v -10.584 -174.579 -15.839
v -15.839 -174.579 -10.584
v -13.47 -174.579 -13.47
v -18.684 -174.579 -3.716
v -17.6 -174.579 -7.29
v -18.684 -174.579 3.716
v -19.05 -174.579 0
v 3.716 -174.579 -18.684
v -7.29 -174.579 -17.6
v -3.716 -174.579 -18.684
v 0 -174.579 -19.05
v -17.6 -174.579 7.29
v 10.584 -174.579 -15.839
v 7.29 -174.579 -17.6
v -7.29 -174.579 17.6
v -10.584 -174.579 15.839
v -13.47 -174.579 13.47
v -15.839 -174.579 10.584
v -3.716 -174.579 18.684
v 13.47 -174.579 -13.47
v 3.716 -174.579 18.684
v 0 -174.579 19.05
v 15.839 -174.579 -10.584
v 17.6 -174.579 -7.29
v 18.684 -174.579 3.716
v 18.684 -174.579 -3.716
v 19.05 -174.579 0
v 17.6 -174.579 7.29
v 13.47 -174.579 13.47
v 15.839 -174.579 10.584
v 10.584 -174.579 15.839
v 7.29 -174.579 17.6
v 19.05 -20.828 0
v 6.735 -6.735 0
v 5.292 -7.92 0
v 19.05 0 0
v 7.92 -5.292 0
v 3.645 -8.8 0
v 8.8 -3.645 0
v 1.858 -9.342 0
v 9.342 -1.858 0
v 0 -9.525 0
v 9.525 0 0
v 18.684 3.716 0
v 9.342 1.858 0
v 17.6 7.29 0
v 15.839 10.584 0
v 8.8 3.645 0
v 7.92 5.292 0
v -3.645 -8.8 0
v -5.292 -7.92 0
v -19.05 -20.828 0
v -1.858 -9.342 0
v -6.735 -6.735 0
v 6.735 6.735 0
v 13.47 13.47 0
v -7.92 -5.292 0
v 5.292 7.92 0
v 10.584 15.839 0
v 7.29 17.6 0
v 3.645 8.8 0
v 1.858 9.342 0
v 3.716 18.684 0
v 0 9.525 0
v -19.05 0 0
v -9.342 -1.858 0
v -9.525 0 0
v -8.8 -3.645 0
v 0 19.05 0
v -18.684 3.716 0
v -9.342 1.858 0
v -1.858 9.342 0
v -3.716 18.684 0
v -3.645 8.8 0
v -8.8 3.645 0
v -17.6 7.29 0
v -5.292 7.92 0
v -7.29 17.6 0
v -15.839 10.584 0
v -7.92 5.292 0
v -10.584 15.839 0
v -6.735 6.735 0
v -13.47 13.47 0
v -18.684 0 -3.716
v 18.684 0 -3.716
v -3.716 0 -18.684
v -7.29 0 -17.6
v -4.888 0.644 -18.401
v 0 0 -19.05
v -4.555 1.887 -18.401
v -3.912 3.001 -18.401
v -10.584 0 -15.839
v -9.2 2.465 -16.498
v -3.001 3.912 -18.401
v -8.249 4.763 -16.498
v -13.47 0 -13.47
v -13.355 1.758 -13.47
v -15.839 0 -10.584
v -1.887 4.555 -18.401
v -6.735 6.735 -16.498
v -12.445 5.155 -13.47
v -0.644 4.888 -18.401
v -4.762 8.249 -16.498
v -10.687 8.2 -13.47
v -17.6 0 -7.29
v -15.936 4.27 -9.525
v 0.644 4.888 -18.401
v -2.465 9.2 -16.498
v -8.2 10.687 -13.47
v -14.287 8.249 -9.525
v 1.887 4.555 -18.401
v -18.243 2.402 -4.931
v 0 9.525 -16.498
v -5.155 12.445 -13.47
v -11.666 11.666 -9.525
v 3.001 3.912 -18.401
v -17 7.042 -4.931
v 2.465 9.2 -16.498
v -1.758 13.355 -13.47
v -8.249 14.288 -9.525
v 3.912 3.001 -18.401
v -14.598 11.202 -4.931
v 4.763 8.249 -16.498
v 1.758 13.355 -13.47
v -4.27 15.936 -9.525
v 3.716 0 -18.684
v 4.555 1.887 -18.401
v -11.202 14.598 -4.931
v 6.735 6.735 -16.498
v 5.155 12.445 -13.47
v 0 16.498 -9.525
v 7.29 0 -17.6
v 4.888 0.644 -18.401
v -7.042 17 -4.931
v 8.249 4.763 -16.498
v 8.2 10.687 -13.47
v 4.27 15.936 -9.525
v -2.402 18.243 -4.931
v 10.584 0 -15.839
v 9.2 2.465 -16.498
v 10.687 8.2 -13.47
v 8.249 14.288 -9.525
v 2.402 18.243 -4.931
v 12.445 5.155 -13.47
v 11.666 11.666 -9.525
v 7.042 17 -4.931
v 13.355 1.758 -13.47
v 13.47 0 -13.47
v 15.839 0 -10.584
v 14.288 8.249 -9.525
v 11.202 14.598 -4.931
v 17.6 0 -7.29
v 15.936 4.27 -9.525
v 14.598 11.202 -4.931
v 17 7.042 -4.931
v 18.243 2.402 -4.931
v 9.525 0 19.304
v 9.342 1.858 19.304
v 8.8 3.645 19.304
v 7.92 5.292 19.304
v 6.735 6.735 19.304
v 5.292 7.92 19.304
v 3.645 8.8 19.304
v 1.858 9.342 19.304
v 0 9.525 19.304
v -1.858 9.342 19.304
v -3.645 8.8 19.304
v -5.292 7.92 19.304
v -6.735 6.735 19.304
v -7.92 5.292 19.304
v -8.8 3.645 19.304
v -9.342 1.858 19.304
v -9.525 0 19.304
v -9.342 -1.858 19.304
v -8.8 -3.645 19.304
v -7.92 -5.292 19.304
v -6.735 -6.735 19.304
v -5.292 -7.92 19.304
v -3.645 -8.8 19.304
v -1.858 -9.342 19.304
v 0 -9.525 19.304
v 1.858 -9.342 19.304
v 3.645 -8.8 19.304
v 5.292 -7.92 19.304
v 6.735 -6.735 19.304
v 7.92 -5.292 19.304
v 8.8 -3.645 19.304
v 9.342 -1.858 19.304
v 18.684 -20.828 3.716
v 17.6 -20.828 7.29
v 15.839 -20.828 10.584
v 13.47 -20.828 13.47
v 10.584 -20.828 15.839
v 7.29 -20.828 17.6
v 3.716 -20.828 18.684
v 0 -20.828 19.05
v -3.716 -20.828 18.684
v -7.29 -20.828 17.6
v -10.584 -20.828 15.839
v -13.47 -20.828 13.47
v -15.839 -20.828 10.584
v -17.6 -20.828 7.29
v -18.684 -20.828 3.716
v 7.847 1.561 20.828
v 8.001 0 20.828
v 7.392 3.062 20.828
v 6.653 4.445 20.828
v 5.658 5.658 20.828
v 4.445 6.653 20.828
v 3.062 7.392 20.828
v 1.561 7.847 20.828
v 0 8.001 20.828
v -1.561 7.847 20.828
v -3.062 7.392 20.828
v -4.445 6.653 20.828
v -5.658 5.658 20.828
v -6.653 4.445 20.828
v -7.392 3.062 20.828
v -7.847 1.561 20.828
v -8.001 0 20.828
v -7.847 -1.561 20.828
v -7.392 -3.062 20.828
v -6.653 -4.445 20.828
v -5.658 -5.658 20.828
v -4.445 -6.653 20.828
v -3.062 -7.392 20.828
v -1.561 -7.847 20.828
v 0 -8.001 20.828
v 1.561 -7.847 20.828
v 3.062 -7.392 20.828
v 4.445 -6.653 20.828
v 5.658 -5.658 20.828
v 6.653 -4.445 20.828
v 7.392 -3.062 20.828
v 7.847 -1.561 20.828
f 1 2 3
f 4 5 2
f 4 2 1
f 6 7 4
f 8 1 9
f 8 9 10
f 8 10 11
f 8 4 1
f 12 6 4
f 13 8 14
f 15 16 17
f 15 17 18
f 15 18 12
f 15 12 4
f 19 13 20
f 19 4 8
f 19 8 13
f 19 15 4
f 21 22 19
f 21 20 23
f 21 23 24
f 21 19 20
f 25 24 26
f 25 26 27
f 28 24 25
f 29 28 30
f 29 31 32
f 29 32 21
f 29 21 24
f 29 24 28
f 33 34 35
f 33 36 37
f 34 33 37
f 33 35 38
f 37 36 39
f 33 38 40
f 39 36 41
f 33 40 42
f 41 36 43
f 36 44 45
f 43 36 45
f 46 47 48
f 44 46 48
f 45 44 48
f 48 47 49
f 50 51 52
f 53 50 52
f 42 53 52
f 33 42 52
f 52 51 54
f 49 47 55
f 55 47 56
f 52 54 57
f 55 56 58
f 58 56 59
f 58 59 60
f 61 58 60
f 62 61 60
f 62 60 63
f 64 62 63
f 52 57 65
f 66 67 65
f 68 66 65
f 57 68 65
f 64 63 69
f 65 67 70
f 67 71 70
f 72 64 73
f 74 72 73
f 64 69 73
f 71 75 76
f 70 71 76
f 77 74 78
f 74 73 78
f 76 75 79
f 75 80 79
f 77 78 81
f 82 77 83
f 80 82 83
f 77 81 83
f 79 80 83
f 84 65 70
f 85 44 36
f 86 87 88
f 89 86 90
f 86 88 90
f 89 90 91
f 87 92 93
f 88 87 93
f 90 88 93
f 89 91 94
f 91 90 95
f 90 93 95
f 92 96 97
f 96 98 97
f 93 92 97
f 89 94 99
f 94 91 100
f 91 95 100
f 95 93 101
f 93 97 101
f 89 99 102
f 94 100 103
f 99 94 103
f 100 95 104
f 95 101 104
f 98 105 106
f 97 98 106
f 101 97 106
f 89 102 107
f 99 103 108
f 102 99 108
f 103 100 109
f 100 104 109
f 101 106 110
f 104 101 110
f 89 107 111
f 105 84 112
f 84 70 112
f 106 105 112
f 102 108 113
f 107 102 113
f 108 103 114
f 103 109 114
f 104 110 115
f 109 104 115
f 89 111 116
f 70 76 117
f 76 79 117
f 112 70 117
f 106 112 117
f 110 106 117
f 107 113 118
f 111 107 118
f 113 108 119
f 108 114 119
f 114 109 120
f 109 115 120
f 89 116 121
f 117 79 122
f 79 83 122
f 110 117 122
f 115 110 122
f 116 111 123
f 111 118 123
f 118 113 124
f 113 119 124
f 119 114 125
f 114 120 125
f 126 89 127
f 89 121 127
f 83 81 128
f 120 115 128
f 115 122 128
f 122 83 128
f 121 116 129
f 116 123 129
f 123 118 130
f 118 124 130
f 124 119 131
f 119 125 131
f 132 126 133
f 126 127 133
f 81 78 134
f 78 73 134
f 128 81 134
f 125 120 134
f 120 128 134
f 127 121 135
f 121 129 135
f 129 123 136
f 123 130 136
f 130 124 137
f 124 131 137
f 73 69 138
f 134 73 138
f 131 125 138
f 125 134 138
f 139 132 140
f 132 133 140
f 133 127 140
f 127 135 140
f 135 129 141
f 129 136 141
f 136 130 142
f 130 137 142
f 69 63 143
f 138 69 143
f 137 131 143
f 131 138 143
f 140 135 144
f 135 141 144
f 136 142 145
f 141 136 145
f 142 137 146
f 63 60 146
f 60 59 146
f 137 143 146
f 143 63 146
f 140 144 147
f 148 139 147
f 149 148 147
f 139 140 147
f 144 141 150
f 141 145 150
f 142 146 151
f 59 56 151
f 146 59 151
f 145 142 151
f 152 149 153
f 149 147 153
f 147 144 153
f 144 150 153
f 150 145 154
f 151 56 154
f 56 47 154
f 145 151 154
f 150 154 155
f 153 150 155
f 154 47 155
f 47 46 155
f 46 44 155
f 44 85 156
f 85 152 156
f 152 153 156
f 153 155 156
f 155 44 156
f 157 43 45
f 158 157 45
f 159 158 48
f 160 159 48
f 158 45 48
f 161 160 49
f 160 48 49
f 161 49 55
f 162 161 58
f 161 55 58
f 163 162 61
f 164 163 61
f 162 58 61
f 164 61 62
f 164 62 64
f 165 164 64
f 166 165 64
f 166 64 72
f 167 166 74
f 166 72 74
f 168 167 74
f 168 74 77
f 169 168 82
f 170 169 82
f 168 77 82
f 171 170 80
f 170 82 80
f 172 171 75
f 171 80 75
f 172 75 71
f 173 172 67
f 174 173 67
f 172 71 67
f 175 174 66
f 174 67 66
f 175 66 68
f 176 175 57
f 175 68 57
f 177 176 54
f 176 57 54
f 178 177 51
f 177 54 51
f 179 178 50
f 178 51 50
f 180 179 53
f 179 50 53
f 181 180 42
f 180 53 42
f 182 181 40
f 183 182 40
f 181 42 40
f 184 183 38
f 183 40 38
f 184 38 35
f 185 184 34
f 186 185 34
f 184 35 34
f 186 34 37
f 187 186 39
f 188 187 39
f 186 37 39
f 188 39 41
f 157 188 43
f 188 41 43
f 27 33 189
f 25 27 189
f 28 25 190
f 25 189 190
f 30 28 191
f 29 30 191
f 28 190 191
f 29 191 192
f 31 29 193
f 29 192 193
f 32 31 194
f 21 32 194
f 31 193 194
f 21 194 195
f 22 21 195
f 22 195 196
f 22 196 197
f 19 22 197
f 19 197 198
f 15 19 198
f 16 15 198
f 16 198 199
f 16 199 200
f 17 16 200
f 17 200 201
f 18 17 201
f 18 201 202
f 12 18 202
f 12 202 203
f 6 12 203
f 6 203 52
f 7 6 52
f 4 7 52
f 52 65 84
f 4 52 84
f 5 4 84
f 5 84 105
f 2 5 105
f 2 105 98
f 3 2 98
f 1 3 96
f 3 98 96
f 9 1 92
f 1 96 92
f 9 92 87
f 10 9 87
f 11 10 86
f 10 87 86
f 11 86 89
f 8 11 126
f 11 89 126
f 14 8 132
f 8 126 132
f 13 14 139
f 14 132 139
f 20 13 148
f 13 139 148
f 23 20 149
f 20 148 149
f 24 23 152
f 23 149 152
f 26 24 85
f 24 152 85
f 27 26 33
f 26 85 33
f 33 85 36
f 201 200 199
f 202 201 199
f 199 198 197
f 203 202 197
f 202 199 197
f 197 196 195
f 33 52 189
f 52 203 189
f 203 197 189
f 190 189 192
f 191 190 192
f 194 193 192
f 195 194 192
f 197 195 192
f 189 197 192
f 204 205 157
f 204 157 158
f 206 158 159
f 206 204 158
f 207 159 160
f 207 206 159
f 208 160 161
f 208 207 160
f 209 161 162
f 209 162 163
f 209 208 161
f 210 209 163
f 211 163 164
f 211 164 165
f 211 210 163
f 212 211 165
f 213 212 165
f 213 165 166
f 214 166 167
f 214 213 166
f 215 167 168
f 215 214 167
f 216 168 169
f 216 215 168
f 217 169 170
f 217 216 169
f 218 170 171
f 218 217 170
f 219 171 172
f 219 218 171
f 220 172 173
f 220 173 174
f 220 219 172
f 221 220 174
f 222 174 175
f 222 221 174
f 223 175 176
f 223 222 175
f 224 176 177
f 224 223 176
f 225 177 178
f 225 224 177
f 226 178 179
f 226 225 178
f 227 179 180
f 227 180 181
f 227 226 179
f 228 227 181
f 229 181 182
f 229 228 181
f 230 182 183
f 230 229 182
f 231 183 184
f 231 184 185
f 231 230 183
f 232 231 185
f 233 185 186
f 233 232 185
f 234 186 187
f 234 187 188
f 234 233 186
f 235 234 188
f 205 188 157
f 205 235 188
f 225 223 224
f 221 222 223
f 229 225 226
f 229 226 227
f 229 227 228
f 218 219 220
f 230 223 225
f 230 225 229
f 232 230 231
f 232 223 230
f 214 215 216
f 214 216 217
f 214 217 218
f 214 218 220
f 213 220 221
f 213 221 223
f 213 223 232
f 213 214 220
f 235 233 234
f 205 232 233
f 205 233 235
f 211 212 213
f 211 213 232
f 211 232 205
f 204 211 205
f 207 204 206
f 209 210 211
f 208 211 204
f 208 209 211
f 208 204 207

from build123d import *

# Parameters (mm, degrees)
F0_R     = 19.05
F1_DEPTH = 174.57928
F4_DEPTH = 20.828
F5_R     = 9.525
F6_DEPTH = 20.828
F7_SIZE2 = 1.524
F7_SIZE  = 1.524


with BuildPart() as f1:
    # F0 (on Front) → F1 (new body)
    with BuildSketch(Plane.XZ):
        Circle(F0_R)
    extrude(amount=F1_DEPTH)

    # F2 (on face) → F3 (revolve)
    with BuildSketch(Plane(origin=(0, 0, 0), x_dir=(-1, 0, 0), z_dir=(0, 1, 0))):
        with BuildLine():
            Line((19.05, 0), (0, 0))
            Line((0, 0), (0, -19.05))
            ThreePointArc((0, -19.05), (13.4703841816, -13.4703841816), (19.05, 0))
        make_face()
    revolve(axis=Axis((0, 0, -2.0931214094), (0, 0, -1)))

    # F4 (cut): a face of the model
    f4_faces = [f1.faces().sort_by_distance(p)[0] for p in [
        (0, 0, 8.0850711091),
    ]]
    extrude(f4_faces, amount=-F4_DEPTH, mode=Mode.SUBTRACT)

    # F5 (on face) → F6 (join)
    with BuildSketch(Plane.XY):
        Circle(F5_R)
    extrude(amount=F6_DEPTH)

    # F7
    f7_edges = [f1.edges().sort_by_distance(p)[0] for p in [
        (-9.525, 0, 20.828),
    ]]
    chamfer(f7_edges, length=F7_SIZE, length2=F7_SIZE2)


solid = f1.part
